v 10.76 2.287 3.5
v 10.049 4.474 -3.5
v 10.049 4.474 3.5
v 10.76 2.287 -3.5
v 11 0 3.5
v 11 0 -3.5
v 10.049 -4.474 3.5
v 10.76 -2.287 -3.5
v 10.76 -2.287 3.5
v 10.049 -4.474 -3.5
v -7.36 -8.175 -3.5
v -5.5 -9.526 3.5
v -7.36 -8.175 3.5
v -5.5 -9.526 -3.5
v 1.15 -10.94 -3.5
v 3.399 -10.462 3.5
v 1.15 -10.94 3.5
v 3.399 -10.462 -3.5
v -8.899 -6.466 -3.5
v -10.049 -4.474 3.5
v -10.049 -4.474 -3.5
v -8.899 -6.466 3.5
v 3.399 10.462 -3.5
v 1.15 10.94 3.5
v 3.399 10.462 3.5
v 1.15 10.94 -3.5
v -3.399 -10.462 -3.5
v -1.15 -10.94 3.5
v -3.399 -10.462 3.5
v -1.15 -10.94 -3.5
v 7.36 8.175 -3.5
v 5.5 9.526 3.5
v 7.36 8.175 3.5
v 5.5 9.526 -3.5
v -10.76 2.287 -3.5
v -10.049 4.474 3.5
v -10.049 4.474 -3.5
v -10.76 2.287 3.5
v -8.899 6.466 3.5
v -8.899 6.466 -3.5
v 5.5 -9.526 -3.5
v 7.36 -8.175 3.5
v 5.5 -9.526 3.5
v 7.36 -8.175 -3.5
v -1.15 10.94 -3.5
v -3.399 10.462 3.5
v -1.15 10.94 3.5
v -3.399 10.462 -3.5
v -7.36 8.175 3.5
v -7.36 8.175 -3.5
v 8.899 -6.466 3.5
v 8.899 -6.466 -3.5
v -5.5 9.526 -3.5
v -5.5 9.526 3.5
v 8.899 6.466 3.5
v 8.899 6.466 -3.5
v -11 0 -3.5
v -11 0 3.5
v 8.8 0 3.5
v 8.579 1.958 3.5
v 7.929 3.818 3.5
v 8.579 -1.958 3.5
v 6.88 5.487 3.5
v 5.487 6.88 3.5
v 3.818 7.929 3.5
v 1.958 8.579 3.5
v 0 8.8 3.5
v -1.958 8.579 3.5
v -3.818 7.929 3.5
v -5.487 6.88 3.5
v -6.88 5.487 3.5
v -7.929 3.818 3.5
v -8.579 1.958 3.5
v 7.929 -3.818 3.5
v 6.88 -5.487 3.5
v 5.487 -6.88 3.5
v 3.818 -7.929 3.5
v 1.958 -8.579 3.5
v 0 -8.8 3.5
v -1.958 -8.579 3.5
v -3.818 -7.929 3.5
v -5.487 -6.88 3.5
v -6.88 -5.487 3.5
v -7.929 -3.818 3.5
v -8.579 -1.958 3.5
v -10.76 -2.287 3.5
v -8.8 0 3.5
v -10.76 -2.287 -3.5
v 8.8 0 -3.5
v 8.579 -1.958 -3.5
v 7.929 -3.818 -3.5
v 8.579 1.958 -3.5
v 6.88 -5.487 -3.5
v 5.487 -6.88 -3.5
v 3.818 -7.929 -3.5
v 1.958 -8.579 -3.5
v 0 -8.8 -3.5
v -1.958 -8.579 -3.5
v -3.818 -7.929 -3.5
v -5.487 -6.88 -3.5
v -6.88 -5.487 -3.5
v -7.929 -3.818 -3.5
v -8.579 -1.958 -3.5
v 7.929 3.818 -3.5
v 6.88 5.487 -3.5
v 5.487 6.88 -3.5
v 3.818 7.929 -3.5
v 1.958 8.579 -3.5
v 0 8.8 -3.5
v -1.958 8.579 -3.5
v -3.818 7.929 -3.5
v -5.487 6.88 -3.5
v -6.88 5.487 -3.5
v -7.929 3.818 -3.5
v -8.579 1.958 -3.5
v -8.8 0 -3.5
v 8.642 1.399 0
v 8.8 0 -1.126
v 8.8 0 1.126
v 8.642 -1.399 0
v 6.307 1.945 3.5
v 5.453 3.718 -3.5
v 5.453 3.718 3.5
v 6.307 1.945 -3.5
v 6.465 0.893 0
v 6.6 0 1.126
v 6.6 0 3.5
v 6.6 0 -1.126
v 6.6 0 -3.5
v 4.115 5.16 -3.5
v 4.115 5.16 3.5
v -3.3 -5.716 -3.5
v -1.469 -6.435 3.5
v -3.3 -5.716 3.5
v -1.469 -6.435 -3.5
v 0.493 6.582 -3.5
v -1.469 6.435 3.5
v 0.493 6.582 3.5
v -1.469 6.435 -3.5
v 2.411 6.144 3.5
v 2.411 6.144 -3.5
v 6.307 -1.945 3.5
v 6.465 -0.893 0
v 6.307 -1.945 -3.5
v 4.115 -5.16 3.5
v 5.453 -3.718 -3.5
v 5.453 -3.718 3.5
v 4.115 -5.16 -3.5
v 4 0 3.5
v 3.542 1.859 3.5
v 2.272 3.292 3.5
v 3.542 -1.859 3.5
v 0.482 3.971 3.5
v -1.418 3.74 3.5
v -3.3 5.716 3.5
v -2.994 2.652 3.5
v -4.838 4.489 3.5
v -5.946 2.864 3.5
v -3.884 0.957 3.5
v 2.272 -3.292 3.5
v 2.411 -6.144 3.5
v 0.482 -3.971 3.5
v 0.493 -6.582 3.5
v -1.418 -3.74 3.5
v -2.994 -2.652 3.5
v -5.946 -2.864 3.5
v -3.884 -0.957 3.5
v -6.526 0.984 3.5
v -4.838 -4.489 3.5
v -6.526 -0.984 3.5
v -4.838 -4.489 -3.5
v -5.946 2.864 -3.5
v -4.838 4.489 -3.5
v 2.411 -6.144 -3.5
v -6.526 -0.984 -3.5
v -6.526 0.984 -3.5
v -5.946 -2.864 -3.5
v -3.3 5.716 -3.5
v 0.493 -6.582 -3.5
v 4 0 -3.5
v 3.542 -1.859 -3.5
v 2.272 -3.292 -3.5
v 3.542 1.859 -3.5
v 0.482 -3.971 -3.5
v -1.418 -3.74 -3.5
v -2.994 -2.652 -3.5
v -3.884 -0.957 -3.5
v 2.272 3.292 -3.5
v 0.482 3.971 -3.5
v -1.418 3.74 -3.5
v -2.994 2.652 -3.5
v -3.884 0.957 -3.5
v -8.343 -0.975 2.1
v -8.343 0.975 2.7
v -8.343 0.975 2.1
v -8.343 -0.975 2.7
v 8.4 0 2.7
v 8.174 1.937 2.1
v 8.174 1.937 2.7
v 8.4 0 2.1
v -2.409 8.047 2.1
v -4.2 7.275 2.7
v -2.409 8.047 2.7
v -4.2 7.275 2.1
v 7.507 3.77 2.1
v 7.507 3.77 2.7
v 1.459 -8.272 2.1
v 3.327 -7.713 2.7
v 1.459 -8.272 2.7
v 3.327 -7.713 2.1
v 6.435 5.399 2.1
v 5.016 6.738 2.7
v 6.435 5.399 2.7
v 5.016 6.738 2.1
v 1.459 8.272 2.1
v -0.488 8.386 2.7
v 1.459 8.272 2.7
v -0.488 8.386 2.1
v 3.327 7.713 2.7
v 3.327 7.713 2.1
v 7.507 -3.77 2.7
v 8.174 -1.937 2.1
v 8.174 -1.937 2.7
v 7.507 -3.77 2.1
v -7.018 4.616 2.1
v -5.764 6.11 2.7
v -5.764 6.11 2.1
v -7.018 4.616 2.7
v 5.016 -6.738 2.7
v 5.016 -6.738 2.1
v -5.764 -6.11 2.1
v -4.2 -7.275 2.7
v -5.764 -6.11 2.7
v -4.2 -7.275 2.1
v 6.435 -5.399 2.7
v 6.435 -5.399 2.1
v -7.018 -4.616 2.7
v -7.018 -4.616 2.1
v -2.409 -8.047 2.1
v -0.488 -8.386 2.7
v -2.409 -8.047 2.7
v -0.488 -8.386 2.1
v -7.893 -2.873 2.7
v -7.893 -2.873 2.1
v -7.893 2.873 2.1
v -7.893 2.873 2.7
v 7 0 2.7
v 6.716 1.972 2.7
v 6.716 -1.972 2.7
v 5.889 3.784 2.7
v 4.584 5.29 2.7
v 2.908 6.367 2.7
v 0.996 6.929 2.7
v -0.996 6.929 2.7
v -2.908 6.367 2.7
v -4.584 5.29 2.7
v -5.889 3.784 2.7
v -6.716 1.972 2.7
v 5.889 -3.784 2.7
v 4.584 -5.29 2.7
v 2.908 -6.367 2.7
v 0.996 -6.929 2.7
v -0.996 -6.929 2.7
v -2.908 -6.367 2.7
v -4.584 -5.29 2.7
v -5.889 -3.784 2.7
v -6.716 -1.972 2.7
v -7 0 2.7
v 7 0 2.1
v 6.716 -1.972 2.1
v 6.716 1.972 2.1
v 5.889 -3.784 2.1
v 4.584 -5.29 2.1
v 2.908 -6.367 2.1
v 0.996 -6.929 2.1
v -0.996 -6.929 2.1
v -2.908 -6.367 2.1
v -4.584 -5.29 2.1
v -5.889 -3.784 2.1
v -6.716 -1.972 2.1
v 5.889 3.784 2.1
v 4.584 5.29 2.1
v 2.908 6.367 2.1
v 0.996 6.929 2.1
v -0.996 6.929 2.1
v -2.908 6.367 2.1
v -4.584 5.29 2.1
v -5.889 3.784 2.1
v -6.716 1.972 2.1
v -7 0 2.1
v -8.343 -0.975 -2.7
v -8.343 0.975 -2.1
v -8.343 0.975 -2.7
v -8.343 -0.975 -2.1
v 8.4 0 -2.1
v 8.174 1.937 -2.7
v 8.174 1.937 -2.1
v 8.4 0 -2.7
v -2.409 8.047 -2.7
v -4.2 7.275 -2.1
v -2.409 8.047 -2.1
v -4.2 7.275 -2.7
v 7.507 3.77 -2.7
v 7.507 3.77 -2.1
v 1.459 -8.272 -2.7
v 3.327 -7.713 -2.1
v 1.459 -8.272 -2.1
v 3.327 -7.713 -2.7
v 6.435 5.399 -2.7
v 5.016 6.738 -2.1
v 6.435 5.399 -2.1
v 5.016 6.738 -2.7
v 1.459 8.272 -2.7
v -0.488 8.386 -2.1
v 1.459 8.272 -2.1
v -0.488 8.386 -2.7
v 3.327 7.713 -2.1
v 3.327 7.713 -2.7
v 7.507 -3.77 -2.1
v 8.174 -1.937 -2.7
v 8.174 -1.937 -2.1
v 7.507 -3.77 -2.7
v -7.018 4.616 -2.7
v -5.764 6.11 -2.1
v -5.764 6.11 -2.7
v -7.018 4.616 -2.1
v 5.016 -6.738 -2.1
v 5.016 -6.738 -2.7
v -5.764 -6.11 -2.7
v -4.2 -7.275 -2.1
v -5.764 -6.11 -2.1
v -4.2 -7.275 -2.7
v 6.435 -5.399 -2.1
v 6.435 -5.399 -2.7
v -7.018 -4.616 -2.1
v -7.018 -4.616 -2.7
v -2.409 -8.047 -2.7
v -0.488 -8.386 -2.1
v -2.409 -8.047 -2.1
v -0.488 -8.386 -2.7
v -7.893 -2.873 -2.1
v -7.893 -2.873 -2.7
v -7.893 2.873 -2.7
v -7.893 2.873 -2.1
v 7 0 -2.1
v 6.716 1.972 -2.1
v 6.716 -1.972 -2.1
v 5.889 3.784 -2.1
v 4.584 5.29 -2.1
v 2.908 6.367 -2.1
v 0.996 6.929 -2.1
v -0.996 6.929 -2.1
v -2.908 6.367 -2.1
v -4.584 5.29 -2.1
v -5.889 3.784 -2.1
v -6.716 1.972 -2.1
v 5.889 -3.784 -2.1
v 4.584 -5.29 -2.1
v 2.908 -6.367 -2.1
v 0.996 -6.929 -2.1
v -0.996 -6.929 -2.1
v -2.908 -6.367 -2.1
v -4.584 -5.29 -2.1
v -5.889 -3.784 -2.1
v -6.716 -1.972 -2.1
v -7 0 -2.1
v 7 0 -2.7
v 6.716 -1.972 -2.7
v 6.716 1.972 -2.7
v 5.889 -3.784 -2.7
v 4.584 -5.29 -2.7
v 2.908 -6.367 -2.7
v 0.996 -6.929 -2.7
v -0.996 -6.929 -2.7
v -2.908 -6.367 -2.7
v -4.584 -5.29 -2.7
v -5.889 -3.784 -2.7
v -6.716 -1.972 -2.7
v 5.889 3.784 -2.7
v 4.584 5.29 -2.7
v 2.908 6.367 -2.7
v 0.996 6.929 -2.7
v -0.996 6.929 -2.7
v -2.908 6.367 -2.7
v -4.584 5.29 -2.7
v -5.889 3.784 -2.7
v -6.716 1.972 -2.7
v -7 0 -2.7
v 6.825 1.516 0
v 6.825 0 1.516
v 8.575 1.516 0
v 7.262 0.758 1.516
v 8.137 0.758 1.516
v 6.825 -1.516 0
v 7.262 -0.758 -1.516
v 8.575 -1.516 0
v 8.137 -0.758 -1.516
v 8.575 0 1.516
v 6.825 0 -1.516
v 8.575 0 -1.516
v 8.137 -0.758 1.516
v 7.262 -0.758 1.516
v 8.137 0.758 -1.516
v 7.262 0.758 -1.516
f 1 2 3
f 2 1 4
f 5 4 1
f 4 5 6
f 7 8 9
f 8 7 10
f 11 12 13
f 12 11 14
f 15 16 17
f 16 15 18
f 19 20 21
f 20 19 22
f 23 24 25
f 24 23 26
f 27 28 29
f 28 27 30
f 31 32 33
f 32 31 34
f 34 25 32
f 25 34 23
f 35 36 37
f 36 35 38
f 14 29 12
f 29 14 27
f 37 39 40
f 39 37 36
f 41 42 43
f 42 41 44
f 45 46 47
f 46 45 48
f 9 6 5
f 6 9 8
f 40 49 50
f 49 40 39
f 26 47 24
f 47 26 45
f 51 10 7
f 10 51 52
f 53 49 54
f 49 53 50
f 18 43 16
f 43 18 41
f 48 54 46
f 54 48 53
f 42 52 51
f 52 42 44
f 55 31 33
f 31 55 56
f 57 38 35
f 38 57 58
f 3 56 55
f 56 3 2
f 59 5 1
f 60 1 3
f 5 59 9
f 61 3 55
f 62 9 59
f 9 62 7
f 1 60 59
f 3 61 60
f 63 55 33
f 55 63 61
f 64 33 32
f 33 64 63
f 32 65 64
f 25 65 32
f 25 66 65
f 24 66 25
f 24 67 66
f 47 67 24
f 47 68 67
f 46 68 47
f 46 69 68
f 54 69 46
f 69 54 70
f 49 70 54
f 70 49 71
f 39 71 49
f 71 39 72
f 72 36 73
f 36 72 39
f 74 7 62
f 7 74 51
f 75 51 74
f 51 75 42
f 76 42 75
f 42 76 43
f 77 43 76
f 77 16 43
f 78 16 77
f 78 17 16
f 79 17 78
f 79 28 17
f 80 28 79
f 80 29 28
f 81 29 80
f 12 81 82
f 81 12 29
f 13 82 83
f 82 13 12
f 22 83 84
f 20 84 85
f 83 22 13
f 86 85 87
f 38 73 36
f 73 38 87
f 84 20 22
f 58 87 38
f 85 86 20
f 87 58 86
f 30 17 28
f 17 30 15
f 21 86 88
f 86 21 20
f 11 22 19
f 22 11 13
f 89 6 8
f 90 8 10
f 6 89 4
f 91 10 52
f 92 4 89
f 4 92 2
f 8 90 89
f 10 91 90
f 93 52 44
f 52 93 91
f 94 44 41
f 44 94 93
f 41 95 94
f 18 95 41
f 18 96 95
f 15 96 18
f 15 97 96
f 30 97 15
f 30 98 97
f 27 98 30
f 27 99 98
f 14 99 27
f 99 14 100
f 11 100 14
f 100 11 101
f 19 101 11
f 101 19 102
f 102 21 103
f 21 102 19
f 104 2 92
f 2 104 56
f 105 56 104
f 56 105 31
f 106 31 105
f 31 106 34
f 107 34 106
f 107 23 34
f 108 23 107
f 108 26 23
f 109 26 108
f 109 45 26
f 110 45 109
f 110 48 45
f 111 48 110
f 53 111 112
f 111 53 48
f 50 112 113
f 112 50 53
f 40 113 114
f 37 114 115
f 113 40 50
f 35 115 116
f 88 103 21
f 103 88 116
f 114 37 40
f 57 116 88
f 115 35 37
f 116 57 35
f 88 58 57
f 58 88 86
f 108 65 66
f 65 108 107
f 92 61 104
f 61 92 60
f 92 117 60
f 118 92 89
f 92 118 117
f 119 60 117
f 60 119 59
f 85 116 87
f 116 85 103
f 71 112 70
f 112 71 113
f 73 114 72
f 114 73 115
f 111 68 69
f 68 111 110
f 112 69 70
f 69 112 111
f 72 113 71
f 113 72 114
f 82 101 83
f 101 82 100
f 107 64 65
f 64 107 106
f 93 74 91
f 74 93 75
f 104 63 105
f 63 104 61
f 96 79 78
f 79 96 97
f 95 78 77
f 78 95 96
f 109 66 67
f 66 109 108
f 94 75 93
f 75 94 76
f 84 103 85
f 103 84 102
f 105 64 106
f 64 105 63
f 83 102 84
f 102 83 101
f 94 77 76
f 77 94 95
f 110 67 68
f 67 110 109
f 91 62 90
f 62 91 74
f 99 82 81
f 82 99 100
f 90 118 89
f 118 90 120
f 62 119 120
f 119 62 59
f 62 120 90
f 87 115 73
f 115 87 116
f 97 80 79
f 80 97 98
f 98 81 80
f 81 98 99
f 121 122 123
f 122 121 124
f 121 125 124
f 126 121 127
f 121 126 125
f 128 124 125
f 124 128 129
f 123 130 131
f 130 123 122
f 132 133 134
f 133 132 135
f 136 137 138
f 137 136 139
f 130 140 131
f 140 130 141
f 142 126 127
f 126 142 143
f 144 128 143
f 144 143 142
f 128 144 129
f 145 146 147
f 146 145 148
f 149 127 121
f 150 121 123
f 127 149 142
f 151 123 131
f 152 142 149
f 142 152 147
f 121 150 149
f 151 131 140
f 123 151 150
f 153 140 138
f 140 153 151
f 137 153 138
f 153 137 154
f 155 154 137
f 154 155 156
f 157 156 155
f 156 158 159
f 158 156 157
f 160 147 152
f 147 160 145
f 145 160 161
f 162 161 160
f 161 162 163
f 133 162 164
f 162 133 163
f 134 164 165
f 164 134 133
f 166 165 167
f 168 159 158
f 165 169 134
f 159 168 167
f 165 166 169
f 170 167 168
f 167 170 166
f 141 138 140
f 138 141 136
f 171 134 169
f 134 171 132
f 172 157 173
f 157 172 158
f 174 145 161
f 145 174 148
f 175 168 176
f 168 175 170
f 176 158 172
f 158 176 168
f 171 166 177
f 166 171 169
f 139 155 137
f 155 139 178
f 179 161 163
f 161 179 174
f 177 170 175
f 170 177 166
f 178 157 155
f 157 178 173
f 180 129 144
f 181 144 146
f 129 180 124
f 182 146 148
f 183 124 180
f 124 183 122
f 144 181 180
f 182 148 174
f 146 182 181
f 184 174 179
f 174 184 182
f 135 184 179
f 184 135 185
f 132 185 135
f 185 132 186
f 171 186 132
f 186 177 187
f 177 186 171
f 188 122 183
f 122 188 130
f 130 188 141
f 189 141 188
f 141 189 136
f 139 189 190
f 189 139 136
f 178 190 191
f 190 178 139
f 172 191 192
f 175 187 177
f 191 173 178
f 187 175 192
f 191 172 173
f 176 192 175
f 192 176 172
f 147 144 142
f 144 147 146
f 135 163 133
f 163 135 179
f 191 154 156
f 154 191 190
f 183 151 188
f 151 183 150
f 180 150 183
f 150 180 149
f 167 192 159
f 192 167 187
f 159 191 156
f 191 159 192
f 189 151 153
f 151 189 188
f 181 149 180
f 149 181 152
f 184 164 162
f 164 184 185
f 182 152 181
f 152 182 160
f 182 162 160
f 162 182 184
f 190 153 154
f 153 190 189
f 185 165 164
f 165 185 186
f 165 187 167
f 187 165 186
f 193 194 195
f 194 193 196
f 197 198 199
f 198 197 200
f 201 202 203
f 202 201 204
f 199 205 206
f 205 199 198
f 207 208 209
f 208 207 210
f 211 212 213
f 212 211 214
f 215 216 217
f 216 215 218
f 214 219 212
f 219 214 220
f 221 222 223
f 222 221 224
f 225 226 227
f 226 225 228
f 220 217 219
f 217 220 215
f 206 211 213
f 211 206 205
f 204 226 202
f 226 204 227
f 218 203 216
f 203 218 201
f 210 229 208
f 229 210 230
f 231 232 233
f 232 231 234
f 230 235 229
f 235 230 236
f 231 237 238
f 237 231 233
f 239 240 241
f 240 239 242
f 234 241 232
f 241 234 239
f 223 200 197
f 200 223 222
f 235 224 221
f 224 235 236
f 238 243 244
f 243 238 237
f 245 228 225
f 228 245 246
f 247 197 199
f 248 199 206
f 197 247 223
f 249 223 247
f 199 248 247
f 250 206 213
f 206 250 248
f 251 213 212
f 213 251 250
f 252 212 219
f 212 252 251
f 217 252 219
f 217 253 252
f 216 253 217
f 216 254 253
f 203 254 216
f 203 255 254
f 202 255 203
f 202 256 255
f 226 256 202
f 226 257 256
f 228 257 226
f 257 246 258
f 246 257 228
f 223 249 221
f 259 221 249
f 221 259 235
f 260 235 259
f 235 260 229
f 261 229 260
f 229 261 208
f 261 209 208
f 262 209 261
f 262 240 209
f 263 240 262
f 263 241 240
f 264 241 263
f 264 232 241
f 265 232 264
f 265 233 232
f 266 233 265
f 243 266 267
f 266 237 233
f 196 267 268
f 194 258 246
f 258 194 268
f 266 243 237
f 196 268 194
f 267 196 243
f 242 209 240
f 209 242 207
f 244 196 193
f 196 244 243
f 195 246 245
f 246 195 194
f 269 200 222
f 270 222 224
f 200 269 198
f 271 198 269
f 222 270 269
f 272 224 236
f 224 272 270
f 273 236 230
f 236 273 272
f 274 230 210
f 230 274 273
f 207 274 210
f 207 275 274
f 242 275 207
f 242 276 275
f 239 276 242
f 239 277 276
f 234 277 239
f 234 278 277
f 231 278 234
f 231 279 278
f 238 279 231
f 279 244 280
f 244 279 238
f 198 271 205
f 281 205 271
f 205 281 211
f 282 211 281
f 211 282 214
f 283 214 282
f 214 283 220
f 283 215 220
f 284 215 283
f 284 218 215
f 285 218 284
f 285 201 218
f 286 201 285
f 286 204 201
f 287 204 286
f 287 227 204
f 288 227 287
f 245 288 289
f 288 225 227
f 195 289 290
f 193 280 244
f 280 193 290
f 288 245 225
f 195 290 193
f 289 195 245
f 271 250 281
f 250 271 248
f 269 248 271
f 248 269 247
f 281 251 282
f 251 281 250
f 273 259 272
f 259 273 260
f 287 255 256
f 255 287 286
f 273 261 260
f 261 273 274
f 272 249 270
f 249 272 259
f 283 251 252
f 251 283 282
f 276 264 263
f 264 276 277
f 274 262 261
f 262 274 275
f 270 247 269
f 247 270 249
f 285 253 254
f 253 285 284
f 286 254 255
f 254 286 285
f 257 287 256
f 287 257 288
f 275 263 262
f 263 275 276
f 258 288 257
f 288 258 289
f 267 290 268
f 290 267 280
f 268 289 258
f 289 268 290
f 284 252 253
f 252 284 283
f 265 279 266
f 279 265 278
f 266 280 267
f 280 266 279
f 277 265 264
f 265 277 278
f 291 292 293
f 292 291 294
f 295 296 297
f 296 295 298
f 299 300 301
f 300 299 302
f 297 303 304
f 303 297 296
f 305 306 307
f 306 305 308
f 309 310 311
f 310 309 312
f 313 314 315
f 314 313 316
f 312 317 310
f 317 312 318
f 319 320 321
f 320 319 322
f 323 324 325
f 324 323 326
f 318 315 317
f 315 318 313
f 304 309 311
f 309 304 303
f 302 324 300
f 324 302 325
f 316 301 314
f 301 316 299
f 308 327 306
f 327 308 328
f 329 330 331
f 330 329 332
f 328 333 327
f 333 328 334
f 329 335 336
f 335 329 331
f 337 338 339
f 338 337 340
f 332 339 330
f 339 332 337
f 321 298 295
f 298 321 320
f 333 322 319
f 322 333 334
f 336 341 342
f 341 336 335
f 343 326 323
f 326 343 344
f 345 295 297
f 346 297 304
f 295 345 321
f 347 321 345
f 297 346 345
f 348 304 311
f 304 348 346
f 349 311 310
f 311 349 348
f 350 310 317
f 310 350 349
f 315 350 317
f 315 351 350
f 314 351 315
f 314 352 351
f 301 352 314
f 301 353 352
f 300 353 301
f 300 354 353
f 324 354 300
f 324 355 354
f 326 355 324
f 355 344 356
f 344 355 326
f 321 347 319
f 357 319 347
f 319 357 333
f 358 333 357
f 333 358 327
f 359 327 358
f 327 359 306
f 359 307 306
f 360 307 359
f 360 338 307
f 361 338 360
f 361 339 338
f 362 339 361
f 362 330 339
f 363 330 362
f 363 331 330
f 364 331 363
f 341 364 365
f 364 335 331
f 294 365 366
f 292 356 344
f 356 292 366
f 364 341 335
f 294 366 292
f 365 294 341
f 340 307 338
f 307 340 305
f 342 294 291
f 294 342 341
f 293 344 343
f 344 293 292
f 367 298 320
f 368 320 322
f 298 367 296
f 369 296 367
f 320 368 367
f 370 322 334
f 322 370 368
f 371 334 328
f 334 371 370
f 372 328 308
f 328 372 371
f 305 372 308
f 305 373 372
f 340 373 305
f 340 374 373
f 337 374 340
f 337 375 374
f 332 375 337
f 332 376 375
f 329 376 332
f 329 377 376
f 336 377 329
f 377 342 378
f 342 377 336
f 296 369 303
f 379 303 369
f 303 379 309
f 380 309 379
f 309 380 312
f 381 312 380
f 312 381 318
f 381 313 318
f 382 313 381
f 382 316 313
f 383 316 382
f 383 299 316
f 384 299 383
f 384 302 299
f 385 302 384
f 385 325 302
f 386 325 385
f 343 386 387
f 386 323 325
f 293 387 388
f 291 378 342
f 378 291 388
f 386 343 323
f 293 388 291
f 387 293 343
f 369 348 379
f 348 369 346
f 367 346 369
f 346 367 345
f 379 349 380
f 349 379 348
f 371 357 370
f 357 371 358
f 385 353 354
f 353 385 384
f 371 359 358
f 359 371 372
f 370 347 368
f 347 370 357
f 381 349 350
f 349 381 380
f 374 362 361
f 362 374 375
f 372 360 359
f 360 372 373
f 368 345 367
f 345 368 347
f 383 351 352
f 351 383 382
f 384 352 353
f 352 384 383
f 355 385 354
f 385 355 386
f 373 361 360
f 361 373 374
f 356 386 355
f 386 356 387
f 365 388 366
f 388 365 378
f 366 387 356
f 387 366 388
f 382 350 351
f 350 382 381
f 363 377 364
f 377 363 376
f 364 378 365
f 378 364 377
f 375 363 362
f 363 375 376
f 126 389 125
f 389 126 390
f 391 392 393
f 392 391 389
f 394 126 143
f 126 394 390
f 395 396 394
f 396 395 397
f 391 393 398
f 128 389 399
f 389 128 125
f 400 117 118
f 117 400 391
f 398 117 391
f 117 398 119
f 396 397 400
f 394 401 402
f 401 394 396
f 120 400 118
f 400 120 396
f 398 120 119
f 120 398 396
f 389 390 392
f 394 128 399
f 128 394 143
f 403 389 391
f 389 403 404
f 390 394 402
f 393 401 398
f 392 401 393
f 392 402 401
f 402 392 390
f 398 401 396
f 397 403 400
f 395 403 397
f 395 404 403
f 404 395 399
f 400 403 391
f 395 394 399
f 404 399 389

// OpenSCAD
// Parameters
bore_diameter_mm = 8.0; //[4.0:16.0:0.1]
outer_diameter_mm = 22.0; //[11.0:44.0:0.1]
width_mm = 7.0; //[3.5:14.0:0.1]
bore_radius_mm = 4.0; //[2.0:8.0:0.1]
outer_radius_mm = 11.0; //[5.5:22.0:0.1]
eps_mm = 0.8; //[0.2:2.0:0.1]
outer_rim_radial_mm = 2.2; //[1.1:4.4:0.1]
inner_hub_radial_mm = 2.6; //[1.3:5.2:0.1]
shield_thickness_mm = 0.6; //[0.3:1.2:0.05]
shield_radial_clearance_mm = 0.4; //[0.2:1.0:0.05]
ball_diameter_mm = 3.5; //[2.0:5.0:0.1]

// Ball Bearing - complete geometry
module ball_bearing() {
  color("Silver") {
    // Outer Ring
    difference() {
      cylinder(r=outer_radius_mm, h=width_mm, center=true);
      cylinder(r=outer_radius_mm - outer_rim_radial_mm, h=width_mm + 2*eps_mm, center=true);
    }
    // Inner Ring
    difference() {
      cylinder(r=bore_radius_mm + inner_hub_radial_mm, h=width_mm, center=true);
      cylinder(r=bore_radius_mm, h=width_mm + 2*eps_mm, center=true);
    }
    // Shields
    union() {
      translate([0, 0, width_mm/2 - shield_thickness_mm/2 - eps_mm])
        difference() {
          cylinder(r=outer_radius_mm - outer_rim_radial_mm - shield_radial_clearance_mm, h=shield_thickness_mm, center=true);
          cylinder(r=bore_radius_mm + inner_hub_radial_mm + shield_radial_clearance_mm, h=shield_thickness_mm + 2*eps_mm, center=true);
        }
      translate([0, 0, -(width_mm/2 - shield_thickness_mm/2 - eps_mm)])
        difference() {
          cylinder(r=outer_radius_mm - outer_rim_radial_mm - shield_radial_clearance_mm, h=shield_thickness_mm, center=true);
          cylinder(r=bore_radius_mm + inner_hub_radial_mm + shield_radial_clearance_mm, h=shield_thickness_mm + 2*eps_mm, center=true);
        }
    }
  }
}

// Bearing Ball - complete geometry
module bearing_ball() {
  color("Copper") {
    translate([(bore_radius_mm + inner_hub_radial_mm + (outer_radius_mm - outer_rim_radial_mm))/2, 0, 0])
      sphere(r=ball_diameter_mm/2, center=true);
  }
}

// Assembly
module assembly() {
  ball_bearing();
  bearing_ball();
}

assembly();
